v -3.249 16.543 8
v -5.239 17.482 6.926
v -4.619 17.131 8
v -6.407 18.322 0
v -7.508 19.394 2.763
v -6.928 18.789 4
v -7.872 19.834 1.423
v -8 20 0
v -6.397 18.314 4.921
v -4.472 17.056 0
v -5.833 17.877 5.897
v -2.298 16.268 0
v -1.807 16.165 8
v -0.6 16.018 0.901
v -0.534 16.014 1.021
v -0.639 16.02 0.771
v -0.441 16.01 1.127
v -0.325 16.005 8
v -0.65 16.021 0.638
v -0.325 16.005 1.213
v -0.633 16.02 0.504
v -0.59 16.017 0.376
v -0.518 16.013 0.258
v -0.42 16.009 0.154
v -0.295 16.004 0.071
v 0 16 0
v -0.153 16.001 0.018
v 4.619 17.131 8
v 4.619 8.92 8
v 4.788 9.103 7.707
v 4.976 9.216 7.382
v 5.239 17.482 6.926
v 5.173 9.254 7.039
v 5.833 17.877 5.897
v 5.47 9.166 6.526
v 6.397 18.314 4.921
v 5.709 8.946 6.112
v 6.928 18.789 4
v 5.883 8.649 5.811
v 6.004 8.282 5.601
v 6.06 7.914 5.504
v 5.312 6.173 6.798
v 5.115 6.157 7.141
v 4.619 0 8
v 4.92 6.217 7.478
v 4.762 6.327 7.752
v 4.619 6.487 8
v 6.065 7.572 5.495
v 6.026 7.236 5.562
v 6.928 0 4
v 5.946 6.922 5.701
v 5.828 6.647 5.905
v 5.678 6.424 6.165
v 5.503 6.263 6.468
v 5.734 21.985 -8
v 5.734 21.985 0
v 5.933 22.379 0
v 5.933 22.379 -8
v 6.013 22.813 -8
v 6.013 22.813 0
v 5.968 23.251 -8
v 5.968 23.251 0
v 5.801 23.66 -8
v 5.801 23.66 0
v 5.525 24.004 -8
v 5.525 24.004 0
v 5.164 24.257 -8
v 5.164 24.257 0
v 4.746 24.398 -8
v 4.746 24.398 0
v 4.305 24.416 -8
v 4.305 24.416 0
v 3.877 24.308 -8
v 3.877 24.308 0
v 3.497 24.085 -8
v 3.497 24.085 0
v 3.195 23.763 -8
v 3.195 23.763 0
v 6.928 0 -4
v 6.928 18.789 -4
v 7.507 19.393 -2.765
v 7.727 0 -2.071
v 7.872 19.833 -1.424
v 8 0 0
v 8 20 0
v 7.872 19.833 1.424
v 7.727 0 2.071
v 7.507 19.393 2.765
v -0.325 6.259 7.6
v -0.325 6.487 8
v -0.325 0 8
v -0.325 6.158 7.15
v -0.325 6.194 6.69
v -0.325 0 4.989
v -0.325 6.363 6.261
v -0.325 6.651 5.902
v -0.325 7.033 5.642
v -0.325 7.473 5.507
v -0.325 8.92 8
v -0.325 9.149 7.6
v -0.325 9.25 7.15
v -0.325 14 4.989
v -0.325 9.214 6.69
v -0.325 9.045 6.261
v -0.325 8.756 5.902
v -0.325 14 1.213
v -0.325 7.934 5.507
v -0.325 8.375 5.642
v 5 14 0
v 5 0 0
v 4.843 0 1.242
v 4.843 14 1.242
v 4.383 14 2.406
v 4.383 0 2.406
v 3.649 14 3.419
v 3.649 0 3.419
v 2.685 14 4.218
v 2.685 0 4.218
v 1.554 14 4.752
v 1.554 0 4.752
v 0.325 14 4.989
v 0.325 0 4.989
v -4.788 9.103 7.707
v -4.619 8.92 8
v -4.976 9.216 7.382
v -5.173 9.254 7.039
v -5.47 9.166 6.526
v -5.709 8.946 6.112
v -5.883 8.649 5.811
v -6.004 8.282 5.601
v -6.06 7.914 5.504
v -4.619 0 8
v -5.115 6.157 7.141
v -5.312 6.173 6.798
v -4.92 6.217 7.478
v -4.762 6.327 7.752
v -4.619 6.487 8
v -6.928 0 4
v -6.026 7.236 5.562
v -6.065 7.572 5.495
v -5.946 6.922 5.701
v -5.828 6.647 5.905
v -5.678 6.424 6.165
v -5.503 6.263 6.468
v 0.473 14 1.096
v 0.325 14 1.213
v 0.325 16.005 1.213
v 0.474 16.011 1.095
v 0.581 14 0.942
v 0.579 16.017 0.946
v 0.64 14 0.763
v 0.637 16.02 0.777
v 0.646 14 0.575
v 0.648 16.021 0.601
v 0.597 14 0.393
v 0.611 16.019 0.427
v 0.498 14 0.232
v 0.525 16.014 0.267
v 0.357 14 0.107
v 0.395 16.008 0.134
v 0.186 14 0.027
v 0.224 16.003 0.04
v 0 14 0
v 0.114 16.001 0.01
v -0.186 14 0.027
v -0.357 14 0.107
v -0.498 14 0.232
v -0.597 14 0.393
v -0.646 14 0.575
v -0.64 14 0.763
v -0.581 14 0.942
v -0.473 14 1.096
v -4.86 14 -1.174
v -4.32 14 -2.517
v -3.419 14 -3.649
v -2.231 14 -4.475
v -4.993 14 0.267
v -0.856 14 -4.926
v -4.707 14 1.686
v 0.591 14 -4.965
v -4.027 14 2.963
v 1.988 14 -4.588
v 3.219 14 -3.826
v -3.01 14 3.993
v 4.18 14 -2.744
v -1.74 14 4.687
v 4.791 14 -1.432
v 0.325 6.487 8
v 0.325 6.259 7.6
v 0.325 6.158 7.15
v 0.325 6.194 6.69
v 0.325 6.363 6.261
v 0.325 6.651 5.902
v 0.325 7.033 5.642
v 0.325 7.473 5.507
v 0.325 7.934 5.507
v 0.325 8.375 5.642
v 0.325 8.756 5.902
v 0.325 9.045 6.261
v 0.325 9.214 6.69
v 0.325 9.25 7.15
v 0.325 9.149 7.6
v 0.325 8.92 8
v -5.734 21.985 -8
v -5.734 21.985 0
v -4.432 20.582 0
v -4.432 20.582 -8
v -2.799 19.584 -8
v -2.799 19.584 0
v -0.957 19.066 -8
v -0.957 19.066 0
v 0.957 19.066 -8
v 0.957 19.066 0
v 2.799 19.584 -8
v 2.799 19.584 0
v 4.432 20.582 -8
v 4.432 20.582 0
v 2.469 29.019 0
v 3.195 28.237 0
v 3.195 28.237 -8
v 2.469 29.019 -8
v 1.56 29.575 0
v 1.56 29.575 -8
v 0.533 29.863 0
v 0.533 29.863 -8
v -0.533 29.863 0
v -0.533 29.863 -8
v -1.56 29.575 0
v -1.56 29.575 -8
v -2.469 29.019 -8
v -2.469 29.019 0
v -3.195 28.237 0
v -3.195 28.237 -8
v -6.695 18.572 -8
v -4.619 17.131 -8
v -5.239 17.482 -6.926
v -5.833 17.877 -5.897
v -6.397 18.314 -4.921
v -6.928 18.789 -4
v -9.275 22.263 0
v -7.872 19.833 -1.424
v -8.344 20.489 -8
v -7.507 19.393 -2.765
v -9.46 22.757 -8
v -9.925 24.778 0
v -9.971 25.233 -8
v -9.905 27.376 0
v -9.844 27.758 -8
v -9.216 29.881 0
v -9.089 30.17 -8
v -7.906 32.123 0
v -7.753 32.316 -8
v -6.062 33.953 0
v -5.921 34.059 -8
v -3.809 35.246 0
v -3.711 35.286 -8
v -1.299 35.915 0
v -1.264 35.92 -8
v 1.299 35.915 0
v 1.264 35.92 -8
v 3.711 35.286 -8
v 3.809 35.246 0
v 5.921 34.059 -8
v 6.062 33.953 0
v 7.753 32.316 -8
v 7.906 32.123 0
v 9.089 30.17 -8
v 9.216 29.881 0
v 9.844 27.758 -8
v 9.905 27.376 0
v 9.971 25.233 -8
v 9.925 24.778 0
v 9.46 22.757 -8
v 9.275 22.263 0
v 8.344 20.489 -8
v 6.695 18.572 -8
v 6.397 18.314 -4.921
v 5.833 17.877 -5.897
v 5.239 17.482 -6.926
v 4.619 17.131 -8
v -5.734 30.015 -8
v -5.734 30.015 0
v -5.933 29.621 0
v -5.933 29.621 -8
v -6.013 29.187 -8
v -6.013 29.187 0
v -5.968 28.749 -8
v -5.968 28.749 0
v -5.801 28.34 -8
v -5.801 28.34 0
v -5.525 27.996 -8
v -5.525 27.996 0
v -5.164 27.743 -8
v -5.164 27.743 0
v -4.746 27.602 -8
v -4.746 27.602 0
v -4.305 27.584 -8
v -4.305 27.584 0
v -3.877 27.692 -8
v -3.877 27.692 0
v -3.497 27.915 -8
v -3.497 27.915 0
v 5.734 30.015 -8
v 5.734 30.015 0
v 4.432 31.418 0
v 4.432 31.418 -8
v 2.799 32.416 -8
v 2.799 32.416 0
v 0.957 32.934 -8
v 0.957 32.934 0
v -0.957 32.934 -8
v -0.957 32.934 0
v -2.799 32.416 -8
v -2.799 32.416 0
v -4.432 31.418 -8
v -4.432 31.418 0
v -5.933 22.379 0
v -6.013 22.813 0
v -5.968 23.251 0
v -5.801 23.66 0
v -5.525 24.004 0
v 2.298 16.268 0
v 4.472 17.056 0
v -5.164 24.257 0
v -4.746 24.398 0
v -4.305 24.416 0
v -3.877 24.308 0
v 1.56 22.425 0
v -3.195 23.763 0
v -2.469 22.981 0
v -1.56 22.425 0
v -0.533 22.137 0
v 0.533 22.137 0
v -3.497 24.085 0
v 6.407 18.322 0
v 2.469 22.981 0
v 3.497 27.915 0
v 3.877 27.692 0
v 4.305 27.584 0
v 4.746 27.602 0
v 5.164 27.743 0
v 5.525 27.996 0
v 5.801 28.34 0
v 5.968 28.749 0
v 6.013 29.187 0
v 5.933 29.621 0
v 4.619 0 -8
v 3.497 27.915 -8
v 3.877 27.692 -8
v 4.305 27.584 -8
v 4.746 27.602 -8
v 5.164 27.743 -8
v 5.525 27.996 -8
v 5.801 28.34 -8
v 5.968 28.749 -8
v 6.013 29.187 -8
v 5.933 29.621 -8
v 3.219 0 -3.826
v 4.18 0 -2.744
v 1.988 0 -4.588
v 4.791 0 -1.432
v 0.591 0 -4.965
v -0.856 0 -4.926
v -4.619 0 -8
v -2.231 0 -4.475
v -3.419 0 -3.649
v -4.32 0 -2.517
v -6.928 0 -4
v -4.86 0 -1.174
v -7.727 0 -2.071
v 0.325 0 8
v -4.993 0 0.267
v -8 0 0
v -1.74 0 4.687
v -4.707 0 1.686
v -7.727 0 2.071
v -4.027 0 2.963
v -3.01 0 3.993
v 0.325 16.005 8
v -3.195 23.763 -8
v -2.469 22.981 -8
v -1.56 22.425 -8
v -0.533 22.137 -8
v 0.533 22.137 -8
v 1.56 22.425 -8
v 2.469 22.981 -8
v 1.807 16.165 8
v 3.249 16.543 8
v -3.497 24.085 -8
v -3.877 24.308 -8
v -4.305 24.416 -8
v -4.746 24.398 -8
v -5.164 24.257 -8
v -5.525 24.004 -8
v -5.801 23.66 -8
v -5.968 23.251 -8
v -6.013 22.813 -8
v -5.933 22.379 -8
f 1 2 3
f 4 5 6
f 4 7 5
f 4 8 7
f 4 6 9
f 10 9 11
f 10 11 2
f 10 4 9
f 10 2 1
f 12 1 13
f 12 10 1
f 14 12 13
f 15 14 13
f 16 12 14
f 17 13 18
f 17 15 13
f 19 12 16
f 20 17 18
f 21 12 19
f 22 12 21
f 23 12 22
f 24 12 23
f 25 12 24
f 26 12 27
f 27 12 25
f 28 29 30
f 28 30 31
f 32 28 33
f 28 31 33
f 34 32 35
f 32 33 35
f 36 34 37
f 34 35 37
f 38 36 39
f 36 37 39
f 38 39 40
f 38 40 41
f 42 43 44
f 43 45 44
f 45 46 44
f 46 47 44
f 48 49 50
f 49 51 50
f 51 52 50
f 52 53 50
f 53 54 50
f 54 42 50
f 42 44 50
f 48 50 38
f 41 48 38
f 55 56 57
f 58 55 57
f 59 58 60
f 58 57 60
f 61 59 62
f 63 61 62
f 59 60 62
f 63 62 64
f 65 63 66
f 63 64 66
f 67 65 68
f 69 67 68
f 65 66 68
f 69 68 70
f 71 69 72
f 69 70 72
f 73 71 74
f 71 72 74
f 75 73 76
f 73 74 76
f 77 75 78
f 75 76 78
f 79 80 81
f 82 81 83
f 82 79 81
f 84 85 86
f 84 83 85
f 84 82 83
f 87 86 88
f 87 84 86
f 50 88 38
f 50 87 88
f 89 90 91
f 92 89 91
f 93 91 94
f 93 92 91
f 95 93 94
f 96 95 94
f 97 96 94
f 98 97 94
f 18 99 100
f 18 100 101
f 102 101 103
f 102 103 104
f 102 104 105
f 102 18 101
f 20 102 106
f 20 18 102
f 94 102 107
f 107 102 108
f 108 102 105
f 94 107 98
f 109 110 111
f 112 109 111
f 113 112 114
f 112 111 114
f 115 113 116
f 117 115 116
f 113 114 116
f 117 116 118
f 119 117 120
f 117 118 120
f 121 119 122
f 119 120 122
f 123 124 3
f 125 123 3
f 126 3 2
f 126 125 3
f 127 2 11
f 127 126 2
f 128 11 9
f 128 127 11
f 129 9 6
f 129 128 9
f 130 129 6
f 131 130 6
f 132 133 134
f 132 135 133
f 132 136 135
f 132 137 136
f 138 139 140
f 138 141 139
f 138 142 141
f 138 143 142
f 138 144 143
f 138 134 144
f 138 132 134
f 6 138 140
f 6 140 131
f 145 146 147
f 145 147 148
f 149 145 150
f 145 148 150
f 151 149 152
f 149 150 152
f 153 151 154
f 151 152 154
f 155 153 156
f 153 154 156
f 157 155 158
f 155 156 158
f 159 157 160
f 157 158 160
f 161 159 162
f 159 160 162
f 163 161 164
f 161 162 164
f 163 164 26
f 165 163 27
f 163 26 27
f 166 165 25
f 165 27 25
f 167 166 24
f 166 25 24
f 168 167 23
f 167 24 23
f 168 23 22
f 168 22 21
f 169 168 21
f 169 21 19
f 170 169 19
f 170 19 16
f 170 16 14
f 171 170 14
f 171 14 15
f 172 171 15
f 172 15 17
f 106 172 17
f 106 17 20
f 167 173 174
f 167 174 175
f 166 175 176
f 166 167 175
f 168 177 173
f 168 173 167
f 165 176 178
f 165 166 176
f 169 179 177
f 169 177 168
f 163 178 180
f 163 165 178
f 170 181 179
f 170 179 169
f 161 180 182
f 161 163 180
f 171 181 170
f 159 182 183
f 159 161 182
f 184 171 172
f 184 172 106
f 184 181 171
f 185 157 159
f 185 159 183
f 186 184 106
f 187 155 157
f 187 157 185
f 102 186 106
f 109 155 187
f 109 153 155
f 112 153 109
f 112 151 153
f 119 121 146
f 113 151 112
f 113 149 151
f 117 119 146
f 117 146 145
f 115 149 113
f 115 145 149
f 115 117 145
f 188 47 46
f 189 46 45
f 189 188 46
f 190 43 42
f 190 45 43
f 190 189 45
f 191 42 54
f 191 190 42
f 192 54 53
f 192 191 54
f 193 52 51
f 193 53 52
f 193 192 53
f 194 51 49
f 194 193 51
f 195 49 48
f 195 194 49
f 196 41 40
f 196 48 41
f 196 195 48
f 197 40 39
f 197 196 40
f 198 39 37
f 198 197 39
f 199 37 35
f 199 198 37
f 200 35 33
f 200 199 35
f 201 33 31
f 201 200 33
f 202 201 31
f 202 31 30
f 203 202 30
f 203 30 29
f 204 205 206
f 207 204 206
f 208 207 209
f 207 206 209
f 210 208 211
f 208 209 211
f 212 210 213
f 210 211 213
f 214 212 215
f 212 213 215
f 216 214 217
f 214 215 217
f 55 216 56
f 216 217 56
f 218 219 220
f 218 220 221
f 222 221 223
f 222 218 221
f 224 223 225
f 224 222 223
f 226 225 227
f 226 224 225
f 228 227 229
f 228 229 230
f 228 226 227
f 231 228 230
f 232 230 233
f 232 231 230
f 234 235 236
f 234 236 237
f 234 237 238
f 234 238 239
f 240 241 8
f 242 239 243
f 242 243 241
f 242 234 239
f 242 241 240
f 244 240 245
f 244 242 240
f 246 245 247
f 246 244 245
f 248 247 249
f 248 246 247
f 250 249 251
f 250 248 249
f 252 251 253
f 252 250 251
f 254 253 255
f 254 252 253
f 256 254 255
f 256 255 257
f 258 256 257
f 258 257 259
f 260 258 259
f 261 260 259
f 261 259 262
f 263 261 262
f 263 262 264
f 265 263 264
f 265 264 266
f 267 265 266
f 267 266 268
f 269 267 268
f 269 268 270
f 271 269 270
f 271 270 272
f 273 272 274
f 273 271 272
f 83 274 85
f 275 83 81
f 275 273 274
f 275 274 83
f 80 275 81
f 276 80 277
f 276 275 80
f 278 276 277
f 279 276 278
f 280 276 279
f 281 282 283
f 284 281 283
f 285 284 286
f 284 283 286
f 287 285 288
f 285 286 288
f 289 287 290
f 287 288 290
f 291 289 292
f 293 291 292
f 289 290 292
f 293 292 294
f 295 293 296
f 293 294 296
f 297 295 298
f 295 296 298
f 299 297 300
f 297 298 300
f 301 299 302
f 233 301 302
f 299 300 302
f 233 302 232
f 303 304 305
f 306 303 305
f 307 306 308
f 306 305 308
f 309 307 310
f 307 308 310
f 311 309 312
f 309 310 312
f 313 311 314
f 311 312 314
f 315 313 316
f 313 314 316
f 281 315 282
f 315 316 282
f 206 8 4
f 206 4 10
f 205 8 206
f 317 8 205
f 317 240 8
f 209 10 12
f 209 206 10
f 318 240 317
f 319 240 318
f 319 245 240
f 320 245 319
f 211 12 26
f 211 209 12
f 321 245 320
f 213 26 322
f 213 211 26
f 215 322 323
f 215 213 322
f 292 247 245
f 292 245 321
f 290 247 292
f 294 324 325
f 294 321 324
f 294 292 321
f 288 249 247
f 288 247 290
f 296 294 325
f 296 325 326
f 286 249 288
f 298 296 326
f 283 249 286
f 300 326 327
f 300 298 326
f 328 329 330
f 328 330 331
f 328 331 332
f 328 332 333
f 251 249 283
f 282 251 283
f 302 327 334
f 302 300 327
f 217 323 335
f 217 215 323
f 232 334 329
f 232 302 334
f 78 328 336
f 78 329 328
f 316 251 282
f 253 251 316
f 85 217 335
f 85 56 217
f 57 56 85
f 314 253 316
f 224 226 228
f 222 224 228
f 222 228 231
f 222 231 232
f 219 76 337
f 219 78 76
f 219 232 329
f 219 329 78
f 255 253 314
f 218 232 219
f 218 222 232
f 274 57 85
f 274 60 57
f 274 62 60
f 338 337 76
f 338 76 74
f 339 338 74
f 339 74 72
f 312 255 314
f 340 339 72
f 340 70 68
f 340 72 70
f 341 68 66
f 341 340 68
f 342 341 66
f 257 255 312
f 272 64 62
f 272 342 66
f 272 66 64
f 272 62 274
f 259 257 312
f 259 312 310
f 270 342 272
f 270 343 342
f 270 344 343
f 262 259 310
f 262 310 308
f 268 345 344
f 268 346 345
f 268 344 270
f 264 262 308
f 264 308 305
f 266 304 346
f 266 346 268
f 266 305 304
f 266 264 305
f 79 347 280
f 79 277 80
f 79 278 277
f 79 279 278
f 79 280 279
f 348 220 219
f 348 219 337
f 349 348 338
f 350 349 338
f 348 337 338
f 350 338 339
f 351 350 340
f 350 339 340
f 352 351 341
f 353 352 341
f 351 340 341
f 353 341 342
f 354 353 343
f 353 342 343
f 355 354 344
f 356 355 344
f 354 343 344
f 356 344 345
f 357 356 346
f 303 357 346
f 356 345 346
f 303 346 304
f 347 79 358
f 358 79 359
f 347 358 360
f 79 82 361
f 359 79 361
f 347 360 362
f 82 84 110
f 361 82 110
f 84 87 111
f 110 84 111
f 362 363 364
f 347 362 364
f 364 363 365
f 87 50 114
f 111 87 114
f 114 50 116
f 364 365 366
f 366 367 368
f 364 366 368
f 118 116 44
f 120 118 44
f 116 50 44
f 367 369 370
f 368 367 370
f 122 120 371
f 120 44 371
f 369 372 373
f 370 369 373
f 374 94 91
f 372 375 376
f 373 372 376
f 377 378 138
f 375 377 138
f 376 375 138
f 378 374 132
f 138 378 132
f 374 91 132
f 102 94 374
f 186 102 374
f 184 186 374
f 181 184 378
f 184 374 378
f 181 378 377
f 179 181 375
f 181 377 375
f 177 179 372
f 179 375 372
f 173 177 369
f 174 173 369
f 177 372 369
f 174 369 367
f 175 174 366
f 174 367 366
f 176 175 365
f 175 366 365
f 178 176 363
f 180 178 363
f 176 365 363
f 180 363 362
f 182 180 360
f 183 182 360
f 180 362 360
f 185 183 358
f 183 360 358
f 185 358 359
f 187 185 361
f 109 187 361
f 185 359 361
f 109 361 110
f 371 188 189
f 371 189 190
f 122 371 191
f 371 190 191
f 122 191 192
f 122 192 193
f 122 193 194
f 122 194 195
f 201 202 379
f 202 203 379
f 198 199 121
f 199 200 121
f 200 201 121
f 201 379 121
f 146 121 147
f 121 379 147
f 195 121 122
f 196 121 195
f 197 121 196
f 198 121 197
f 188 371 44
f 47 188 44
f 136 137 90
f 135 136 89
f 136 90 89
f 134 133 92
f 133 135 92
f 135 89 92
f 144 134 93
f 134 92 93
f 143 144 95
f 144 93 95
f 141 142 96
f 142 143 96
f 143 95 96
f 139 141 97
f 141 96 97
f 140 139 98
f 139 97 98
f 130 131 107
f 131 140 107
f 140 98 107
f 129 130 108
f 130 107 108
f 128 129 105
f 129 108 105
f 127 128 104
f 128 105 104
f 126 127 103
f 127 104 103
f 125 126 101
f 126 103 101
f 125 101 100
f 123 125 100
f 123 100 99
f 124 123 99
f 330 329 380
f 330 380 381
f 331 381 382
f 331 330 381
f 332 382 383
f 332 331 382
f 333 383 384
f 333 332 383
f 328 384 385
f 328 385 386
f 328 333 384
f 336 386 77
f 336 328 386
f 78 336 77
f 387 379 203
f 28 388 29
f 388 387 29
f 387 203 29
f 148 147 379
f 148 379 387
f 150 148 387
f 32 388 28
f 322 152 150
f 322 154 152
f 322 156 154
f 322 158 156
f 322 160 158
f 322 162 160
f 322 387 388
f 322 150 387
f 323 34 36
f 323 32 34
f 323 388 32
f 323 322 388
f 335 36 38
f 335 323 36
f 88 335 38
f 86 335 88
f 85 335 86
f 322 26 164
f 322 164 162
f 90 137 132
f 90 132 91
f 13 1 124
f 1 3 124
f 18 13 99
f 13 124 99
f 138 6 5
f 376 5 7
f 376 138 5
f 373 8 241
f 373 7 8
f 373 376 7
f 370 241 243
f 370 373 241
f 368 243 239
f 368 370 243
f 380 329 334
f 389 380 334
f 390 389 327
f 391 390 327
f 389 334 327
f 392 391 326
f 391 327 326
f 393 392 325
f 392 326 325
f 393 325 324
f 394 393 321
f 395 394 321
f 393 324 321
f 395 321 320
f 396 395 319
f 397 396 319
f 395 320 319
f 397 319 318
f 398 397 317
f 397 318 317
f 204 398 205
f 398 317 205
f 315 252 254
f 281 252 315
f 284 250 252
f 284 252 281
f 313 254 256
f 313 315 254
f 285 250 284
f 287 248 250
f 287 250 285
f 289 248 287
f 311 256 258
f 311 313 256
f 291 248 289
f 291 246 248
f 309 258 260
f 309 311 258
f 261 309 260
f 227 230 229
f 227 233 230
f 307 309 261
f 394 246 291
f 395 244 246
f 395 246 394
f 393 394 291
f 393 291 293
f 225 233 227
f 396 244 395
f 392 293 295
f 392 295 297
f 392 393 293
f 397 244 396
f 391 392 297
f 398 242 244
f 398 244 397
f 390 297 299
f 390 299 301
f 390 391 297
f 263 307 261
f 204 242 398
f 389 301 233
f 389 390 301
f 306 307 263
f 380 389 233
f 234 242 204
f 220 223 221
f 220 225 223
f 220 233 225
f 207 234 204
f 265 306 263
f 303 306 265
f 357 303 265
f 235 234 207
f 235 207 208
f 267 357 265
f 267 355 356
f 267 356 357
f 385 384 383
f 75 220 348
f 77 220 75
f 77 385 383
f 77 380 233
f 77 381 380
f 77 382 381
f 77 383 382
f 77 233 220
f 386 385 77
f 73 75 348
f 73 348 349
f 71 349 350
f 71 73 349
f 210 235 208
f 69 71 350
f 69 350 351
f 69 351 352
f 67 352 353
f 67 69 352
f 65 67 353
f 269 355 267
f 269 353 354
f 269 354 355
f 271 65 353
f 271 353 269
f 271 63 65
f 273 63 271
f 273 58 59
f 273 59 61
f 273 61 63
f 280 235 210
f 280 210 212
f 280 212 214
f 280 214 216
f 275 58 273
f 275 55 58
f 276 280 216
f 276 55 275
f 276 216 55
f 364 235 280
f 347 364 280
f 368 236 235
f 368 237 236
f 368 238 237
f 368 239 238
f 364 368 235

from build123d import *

# Parameters (mm, degrees)
EXTRUDE_DEPTH                  = 20
EXTRUDE_ONTO_SKETCH_ROLL_ANGLE = 90
SKETCH001_R                    = 5
POCKET_DEPTH                   = 14
POCKET001_DEPTH                = 20.001
SKETCH003_R                    = 10
EXTRUDE001_DEPTH               = 8
SKETCH004_R                    = 10
POCKET002_DEPTH                = 8.001
POCKET003_DEPTH                = 8.001
SKETCH006_R                    = 1.55
POCKET004_DEPTH                = 9.676
POCKET004_DEPTH_BACK           = -10.326


with BuildPart() as pocket001:
    # Sketch as drawn → Extrude (new)
    with BuildSketch(Plane.XY):
        with BuildLine():
            Line((-4.618802, 8), (4.618805, 8))
            Line((4.618805, 8), (6.928207, 3.999994))
            ThreePointArc((6.928203, -4), (8, -3e-06), (6.928207, 3.999994))
            Line((4.618802, -8), (6.928203, -4))
            Line((-4.618805, -8), (4.618802, -8))
            Line((-6.928208, -3.999992), (-4.618805, -8))
            ThreePointArc((-6.928205, 3.999998), (-8, 3e-06), (-6.928208, -3.999992))
            Line((-4.618802, 8), (-6.928205, 3.999998))
        make_face()
    extrude(amount=-EXTRUDE_DEPTH)


with BuildPart() as pocket001_1:
    # Extrude onto Sketch roll: moved
    add(pocket001.part.rotate(Axis((0, 0, 0), (1, 0, 0)), EXTRUDE_ONTO_SKETCH_ROLL_ANGLE))


with BuildPart() as pocket001_2:
    # Extrude onto Sketch placement: moved
    add(pocket001_1.part)

    # Sketch001 → Pocket (cut)
    with BuildSketch(Plane.XZ):
        Circle(SKETCH001_R)
    extrude(amount=-POCKET_DEPTH, mode=Mode.SUBTRACT)

    # Sketch002 → Pocket001 (cut, through all)
    with BuildSketch(Plane(origin=(0, 20, 0), x_dir=(-1, 0, 0), z_dir=(0, 1, 0))):
        with BuildLine():
            ThreePointArc((-0.325, 1.212917), (0, 0), (0.325, 1.212917))
            Line((0.325, 8), (0.325, 1.212917))
            Line((-0.325, 8), (0.325, 8))
            Line((-0.325, 8), (-0.325, 1.212917))
        make_face()
    extrude(amount=-POCKET001_DEPTH, mode=Mode.SUBTRACT)


with BuildPart() as pocket004:
    # Sketch003 → Extrude001 (new body)
    with BuildSketch(Plane(origin=(0, 0, -8), x_dir=(1, 0, 0), z_dir=(0, 0, -1))):
        with Locations((0, -26)):
            Circle(SKETCH003_R)
    extrude(amount=-EXTRUDE001_DEPTH)

    # Fusion: union Pocket001
    add(pocket001_2.part)

    # Sketch004 → Pocket002 (cut, through all)
    with BuildSketch(Plane.XY):
        with Locations((0, 26)):
            Circle(SKETCH004_R)
    extrude(amount=POCKET002_DEPTH, mode=Mode.SUBTRACT)

    # Sketch005 → Pocket003 (cut, through all)
    with BuildSketch(Plane.XY):
        with BuildLine():
            ThreePointArc((3.194693, 28.236948), (0, 29.9), (-3.194693, 28.236948))
            ThreePointArc((-5.734064, 30.015035), (-5.353422, 27.856306), (-3.194693, 28.236948))
            ThreePointArc((5.734064, 30.015035), (0, 33), (-5.734064, 30.015035))
            ThreePointArc((3.194693, 28.236948), (5.353422, 27.856306), (5.734064, 30.015035))
        make_face()
        with BuildLine():
            ThreePointArc((-3.194693, 23.763052), (0, 22.1), (3.194693, 23.763052))
            ThreePointArc((5.734064, 21.984965), (5.353422, 24.143694), (3.194693, 23.763052))
            ThreePointArc((-5.734064, 21.984965), (0, 19), (5.734064, 21.984965))
            ThreePointArc((-3.194693, 23.763052), (-5.353422, 24.143694), (-5.734064, 21.984965))
        make_face()
    extrude(amount=-POCKET003_DEPTH, mode=Mode.SUBTRACT)

    # Sketch006 → Pocket004 (cut, two sides)
    with BuildSketch(Plane.YZ.offset(-0.325)) as pocket004_sk:
        with Locations((7.70394, 7.039426)):
            Circle(SKETCH006_R)
    extrude(amount=-POCKET004_DEPTH, mode=Mode.SUBTRACT)
    extrude(pocket004_sk.sketch, amount=-POCKET004_DEPTH_BACK, mode=Mode.SUBTRACT)


solid = pocket004.part
